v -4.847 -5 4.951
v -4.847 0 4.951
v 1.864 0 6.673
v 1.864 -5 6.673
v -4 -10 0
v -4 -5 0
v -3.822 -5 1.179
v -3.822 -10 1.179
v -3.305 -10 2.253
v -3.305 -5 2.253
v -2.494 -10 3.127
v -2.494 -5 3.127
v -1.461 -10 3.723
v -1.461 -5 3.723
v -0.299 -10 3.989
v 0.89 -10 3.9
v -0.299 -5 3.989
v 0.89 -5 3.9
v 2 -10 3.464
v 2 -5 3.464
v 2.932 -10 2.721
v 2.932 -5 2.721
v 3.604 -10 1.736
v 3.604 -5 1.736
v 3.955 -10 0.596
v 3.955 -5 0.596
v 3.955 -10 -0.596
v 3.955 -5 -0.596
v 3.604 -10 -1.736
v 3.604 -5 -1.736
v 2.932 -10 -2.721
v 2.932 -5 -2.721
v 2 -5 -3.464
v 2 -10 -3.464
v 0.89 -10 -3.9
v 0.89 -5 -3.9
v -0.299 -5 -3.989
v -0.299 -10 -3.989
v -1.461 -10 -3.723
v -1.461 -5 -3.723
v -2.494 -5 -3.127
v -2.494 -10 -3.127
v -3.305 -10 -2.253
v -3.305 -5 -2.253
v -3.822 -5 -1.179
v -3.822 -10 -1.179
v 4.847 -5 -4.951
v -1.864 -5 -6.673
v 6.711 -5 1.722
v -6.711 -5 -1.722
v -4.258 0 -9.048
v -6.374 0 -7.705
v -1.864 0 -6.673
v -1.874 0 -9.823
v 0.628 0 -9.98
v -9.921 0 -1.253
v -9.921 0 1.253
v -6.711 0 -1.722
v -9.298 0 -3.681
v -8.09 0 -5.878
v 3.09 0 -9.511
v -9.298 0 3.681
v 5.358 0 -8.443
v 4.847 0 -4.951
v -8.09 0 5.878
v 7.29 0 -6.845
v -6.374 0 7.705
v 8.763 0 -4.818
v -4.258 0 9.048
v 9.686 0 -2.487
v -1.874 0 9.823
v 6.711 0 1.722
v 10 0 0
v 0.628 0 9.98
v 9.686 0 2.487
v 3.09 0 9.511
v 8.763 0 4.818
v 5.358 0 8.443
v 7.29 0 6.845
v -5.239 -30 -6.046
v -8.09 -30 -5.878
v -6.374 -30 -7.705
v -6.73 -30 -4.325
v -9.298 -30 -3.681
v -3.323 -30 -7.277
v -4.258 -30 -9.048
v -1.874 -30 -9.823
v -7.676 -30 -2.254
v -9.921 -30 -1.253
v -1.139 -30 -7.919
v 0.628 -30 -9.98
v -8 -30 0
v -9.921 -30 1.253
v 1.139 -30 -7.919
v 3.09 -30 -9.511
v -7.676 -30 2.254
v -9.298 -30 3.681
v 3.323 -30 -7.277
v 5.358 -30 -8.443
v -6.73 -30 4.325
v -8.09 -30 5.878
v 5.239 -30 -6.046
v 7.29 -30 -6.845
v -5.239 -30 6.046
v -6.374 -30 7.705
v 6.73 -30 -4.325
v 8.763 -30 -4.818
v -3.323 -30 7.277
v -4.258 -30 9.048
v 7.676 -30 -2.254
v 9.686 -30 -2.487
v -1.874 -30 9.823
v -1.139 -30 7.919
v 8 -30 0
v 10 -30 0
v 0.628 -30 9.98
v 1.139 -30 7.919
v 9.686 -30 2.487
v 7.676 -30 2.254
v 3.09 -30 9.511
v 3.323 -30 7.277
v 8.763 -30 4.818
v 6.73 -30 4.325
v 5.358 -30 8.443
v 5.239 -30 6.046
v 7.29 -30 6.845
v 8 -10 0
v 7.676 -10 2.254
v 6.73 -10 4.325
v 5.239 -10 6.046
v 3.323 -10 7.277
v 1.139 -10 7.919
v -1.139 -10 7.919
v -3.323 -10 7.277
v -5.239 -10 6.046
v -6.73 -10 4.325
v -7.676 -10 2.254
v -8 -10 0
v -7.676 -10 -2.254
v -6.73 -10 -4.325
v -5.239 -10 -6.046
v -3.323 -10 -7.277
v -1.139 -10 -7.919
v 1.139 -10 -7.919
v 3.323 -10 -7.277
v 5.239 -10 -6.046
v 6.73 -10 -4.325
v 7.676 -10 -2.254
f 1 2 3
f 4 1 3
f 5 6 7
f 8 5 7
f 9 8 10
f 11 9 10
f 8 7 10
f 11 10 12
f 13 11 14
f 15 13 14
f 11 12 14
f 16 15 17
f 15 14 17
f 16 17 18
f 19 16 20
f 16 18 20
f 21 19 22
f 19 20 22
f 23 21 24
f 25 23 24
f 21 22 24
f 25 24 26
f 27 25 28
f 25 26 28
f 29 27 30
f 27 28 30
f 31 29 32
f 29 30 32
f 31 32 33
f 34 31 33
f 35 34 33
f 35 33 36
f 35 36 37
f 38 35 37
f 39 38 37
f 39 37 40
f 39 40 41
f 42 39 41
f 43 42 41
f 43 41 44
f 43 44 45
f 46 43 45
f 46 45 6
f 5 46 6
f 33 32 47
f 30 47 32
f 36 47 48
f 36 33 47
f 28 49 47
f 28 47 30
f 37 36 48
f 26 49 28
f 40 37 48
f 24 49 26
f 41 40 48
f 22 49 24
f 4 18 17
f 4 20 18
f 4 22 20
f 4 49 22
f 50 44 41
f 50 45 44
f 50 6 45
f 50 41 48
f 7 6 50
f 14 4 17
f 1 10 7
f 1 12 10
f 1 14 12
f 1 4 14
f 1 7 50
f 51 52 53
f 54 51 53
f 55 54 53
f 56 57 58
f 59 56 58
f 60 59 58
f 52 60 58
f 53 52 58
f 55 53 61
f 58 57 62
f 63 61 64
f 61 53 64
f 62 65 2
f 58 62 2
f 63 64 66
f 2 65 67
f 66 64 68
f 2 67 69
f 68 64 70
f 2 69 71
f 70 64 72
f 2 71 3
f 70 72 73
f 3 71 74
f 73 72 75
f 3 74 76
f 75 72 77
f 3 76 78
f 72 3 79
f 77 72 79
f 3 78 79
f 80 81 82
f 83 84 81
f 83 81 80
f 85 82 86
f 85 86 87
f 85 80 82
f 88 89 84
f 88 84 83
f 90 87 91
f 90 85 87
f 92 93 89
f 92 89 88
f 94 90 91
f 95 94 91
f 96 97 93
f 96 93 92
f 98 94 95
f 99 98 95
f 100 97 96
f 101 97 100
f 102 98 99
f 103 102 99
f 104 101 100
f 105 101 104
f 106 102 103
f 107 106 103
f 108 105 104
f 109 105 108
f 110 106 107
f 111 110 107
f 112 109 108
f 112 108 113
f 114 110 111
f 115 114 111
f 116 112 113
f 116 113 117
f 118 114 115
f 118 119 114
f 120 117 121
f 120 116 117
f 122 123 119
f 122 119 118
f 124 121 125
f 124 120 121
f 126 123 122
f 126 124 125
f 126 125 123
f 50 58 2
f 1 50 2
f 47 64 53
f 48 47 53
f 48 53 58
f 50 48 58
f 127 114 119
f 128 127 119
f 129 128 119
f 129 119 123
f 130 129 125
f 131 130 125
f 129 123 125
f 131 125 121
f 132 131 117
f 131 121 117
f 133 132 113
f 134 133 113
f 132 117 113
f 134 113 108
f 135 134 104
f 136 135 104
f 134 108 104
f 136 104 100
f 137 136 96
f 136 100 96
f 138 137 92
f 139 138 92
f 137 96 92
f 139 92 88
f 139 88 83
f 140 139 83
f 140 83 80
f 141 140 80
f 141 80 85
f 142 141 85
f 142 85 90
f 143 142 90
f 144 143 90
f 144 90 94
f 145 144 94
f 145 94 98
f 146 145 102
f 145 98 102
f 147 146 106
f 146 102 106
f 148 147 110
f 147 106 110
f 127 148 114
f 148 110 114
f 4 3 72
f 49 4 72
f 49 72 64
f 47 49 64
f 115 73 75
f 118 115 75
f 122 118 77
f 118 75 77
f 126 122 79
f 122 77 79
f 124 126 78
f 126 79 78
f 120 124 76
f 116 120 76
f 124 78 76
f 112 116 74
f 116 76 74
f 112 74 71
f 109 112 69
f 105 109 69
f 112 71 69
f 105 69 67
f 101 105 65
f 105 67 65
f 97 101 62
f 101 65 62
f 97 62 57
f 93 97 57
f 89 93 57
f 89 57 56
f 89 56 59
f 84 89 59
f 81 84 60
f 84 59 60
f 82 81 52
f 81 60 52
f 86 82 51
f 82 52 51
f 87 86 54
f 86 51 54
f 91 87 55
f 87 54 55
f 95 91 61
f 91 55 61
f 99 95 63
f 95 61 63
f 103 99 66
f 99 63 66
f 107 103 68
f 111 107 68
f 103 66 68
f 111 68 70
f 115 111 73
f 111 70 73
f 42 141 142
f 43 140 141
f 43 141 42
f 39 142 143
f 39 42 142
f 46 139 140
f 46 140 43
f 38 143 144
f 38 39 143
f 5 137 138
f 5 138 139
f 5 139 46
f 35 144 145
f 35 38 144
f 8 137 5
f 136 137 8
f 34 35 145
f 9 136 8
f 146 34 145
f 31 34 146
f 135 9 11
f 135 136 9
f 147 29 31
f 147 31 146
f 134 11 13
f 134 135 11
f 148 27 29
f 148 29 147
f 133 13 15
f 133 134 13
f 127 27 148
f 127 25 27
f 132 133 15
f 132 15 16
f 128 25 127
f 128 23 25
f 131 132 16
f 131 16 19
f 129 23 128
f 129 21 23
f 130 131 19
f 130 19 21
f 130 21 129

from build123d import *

# Parameters (mm, degrees)
F0_R     = 10
F1_DEPTH = 30
F2_R     = 8
F3_DEPTH = 20
F4_R     = 4
F5_DEPTH = 30.001
F7_DEPTH = 5


with BuildPart() as f1:
    # F0 (on Front) → F1 (new body)
    with BuildSketch(Plane.XZ):
        Circle(F0_R)
    extrude(amount=F1_DEPTH)

    # F2 (on face) → F3 (cut)
    with BuildSketch(Plane.XZ.offset(30)):
        Circle(F2_R)
    extrude(amount=-F3_DEPTH, mode=Mode.SUBTRACT)

    # F4 (on face) → F5 (cut, through all)
    with BuildSketch(Plane(origin=(0, 0, 0), x_dir=(-1, 0, 0), z_dir=(0, 1, 0))):
        Circle(F4_R)
    extrude(amount=-F5_DEPTH, mode=Mode.SUBTRACT)

    # F6 (on face) → F7 (cut)
    with BuildSketch(Plane(origin=(0, 0, 0), x_dir=(-1, 0, 0), z_dir=(0, 1, 0))):
        Polygon((4.846734, 4.950674), (-1.864042, 6.672732), (-6.710776, 1.722058), (-4.846734, -4.950674), (1.864042, -6.672732), (6.710776, -1.722058), align=None)
    extrude(amount=-F7_DEPTH, mode=Mode.SUBTRACT)


solid = f1.part
